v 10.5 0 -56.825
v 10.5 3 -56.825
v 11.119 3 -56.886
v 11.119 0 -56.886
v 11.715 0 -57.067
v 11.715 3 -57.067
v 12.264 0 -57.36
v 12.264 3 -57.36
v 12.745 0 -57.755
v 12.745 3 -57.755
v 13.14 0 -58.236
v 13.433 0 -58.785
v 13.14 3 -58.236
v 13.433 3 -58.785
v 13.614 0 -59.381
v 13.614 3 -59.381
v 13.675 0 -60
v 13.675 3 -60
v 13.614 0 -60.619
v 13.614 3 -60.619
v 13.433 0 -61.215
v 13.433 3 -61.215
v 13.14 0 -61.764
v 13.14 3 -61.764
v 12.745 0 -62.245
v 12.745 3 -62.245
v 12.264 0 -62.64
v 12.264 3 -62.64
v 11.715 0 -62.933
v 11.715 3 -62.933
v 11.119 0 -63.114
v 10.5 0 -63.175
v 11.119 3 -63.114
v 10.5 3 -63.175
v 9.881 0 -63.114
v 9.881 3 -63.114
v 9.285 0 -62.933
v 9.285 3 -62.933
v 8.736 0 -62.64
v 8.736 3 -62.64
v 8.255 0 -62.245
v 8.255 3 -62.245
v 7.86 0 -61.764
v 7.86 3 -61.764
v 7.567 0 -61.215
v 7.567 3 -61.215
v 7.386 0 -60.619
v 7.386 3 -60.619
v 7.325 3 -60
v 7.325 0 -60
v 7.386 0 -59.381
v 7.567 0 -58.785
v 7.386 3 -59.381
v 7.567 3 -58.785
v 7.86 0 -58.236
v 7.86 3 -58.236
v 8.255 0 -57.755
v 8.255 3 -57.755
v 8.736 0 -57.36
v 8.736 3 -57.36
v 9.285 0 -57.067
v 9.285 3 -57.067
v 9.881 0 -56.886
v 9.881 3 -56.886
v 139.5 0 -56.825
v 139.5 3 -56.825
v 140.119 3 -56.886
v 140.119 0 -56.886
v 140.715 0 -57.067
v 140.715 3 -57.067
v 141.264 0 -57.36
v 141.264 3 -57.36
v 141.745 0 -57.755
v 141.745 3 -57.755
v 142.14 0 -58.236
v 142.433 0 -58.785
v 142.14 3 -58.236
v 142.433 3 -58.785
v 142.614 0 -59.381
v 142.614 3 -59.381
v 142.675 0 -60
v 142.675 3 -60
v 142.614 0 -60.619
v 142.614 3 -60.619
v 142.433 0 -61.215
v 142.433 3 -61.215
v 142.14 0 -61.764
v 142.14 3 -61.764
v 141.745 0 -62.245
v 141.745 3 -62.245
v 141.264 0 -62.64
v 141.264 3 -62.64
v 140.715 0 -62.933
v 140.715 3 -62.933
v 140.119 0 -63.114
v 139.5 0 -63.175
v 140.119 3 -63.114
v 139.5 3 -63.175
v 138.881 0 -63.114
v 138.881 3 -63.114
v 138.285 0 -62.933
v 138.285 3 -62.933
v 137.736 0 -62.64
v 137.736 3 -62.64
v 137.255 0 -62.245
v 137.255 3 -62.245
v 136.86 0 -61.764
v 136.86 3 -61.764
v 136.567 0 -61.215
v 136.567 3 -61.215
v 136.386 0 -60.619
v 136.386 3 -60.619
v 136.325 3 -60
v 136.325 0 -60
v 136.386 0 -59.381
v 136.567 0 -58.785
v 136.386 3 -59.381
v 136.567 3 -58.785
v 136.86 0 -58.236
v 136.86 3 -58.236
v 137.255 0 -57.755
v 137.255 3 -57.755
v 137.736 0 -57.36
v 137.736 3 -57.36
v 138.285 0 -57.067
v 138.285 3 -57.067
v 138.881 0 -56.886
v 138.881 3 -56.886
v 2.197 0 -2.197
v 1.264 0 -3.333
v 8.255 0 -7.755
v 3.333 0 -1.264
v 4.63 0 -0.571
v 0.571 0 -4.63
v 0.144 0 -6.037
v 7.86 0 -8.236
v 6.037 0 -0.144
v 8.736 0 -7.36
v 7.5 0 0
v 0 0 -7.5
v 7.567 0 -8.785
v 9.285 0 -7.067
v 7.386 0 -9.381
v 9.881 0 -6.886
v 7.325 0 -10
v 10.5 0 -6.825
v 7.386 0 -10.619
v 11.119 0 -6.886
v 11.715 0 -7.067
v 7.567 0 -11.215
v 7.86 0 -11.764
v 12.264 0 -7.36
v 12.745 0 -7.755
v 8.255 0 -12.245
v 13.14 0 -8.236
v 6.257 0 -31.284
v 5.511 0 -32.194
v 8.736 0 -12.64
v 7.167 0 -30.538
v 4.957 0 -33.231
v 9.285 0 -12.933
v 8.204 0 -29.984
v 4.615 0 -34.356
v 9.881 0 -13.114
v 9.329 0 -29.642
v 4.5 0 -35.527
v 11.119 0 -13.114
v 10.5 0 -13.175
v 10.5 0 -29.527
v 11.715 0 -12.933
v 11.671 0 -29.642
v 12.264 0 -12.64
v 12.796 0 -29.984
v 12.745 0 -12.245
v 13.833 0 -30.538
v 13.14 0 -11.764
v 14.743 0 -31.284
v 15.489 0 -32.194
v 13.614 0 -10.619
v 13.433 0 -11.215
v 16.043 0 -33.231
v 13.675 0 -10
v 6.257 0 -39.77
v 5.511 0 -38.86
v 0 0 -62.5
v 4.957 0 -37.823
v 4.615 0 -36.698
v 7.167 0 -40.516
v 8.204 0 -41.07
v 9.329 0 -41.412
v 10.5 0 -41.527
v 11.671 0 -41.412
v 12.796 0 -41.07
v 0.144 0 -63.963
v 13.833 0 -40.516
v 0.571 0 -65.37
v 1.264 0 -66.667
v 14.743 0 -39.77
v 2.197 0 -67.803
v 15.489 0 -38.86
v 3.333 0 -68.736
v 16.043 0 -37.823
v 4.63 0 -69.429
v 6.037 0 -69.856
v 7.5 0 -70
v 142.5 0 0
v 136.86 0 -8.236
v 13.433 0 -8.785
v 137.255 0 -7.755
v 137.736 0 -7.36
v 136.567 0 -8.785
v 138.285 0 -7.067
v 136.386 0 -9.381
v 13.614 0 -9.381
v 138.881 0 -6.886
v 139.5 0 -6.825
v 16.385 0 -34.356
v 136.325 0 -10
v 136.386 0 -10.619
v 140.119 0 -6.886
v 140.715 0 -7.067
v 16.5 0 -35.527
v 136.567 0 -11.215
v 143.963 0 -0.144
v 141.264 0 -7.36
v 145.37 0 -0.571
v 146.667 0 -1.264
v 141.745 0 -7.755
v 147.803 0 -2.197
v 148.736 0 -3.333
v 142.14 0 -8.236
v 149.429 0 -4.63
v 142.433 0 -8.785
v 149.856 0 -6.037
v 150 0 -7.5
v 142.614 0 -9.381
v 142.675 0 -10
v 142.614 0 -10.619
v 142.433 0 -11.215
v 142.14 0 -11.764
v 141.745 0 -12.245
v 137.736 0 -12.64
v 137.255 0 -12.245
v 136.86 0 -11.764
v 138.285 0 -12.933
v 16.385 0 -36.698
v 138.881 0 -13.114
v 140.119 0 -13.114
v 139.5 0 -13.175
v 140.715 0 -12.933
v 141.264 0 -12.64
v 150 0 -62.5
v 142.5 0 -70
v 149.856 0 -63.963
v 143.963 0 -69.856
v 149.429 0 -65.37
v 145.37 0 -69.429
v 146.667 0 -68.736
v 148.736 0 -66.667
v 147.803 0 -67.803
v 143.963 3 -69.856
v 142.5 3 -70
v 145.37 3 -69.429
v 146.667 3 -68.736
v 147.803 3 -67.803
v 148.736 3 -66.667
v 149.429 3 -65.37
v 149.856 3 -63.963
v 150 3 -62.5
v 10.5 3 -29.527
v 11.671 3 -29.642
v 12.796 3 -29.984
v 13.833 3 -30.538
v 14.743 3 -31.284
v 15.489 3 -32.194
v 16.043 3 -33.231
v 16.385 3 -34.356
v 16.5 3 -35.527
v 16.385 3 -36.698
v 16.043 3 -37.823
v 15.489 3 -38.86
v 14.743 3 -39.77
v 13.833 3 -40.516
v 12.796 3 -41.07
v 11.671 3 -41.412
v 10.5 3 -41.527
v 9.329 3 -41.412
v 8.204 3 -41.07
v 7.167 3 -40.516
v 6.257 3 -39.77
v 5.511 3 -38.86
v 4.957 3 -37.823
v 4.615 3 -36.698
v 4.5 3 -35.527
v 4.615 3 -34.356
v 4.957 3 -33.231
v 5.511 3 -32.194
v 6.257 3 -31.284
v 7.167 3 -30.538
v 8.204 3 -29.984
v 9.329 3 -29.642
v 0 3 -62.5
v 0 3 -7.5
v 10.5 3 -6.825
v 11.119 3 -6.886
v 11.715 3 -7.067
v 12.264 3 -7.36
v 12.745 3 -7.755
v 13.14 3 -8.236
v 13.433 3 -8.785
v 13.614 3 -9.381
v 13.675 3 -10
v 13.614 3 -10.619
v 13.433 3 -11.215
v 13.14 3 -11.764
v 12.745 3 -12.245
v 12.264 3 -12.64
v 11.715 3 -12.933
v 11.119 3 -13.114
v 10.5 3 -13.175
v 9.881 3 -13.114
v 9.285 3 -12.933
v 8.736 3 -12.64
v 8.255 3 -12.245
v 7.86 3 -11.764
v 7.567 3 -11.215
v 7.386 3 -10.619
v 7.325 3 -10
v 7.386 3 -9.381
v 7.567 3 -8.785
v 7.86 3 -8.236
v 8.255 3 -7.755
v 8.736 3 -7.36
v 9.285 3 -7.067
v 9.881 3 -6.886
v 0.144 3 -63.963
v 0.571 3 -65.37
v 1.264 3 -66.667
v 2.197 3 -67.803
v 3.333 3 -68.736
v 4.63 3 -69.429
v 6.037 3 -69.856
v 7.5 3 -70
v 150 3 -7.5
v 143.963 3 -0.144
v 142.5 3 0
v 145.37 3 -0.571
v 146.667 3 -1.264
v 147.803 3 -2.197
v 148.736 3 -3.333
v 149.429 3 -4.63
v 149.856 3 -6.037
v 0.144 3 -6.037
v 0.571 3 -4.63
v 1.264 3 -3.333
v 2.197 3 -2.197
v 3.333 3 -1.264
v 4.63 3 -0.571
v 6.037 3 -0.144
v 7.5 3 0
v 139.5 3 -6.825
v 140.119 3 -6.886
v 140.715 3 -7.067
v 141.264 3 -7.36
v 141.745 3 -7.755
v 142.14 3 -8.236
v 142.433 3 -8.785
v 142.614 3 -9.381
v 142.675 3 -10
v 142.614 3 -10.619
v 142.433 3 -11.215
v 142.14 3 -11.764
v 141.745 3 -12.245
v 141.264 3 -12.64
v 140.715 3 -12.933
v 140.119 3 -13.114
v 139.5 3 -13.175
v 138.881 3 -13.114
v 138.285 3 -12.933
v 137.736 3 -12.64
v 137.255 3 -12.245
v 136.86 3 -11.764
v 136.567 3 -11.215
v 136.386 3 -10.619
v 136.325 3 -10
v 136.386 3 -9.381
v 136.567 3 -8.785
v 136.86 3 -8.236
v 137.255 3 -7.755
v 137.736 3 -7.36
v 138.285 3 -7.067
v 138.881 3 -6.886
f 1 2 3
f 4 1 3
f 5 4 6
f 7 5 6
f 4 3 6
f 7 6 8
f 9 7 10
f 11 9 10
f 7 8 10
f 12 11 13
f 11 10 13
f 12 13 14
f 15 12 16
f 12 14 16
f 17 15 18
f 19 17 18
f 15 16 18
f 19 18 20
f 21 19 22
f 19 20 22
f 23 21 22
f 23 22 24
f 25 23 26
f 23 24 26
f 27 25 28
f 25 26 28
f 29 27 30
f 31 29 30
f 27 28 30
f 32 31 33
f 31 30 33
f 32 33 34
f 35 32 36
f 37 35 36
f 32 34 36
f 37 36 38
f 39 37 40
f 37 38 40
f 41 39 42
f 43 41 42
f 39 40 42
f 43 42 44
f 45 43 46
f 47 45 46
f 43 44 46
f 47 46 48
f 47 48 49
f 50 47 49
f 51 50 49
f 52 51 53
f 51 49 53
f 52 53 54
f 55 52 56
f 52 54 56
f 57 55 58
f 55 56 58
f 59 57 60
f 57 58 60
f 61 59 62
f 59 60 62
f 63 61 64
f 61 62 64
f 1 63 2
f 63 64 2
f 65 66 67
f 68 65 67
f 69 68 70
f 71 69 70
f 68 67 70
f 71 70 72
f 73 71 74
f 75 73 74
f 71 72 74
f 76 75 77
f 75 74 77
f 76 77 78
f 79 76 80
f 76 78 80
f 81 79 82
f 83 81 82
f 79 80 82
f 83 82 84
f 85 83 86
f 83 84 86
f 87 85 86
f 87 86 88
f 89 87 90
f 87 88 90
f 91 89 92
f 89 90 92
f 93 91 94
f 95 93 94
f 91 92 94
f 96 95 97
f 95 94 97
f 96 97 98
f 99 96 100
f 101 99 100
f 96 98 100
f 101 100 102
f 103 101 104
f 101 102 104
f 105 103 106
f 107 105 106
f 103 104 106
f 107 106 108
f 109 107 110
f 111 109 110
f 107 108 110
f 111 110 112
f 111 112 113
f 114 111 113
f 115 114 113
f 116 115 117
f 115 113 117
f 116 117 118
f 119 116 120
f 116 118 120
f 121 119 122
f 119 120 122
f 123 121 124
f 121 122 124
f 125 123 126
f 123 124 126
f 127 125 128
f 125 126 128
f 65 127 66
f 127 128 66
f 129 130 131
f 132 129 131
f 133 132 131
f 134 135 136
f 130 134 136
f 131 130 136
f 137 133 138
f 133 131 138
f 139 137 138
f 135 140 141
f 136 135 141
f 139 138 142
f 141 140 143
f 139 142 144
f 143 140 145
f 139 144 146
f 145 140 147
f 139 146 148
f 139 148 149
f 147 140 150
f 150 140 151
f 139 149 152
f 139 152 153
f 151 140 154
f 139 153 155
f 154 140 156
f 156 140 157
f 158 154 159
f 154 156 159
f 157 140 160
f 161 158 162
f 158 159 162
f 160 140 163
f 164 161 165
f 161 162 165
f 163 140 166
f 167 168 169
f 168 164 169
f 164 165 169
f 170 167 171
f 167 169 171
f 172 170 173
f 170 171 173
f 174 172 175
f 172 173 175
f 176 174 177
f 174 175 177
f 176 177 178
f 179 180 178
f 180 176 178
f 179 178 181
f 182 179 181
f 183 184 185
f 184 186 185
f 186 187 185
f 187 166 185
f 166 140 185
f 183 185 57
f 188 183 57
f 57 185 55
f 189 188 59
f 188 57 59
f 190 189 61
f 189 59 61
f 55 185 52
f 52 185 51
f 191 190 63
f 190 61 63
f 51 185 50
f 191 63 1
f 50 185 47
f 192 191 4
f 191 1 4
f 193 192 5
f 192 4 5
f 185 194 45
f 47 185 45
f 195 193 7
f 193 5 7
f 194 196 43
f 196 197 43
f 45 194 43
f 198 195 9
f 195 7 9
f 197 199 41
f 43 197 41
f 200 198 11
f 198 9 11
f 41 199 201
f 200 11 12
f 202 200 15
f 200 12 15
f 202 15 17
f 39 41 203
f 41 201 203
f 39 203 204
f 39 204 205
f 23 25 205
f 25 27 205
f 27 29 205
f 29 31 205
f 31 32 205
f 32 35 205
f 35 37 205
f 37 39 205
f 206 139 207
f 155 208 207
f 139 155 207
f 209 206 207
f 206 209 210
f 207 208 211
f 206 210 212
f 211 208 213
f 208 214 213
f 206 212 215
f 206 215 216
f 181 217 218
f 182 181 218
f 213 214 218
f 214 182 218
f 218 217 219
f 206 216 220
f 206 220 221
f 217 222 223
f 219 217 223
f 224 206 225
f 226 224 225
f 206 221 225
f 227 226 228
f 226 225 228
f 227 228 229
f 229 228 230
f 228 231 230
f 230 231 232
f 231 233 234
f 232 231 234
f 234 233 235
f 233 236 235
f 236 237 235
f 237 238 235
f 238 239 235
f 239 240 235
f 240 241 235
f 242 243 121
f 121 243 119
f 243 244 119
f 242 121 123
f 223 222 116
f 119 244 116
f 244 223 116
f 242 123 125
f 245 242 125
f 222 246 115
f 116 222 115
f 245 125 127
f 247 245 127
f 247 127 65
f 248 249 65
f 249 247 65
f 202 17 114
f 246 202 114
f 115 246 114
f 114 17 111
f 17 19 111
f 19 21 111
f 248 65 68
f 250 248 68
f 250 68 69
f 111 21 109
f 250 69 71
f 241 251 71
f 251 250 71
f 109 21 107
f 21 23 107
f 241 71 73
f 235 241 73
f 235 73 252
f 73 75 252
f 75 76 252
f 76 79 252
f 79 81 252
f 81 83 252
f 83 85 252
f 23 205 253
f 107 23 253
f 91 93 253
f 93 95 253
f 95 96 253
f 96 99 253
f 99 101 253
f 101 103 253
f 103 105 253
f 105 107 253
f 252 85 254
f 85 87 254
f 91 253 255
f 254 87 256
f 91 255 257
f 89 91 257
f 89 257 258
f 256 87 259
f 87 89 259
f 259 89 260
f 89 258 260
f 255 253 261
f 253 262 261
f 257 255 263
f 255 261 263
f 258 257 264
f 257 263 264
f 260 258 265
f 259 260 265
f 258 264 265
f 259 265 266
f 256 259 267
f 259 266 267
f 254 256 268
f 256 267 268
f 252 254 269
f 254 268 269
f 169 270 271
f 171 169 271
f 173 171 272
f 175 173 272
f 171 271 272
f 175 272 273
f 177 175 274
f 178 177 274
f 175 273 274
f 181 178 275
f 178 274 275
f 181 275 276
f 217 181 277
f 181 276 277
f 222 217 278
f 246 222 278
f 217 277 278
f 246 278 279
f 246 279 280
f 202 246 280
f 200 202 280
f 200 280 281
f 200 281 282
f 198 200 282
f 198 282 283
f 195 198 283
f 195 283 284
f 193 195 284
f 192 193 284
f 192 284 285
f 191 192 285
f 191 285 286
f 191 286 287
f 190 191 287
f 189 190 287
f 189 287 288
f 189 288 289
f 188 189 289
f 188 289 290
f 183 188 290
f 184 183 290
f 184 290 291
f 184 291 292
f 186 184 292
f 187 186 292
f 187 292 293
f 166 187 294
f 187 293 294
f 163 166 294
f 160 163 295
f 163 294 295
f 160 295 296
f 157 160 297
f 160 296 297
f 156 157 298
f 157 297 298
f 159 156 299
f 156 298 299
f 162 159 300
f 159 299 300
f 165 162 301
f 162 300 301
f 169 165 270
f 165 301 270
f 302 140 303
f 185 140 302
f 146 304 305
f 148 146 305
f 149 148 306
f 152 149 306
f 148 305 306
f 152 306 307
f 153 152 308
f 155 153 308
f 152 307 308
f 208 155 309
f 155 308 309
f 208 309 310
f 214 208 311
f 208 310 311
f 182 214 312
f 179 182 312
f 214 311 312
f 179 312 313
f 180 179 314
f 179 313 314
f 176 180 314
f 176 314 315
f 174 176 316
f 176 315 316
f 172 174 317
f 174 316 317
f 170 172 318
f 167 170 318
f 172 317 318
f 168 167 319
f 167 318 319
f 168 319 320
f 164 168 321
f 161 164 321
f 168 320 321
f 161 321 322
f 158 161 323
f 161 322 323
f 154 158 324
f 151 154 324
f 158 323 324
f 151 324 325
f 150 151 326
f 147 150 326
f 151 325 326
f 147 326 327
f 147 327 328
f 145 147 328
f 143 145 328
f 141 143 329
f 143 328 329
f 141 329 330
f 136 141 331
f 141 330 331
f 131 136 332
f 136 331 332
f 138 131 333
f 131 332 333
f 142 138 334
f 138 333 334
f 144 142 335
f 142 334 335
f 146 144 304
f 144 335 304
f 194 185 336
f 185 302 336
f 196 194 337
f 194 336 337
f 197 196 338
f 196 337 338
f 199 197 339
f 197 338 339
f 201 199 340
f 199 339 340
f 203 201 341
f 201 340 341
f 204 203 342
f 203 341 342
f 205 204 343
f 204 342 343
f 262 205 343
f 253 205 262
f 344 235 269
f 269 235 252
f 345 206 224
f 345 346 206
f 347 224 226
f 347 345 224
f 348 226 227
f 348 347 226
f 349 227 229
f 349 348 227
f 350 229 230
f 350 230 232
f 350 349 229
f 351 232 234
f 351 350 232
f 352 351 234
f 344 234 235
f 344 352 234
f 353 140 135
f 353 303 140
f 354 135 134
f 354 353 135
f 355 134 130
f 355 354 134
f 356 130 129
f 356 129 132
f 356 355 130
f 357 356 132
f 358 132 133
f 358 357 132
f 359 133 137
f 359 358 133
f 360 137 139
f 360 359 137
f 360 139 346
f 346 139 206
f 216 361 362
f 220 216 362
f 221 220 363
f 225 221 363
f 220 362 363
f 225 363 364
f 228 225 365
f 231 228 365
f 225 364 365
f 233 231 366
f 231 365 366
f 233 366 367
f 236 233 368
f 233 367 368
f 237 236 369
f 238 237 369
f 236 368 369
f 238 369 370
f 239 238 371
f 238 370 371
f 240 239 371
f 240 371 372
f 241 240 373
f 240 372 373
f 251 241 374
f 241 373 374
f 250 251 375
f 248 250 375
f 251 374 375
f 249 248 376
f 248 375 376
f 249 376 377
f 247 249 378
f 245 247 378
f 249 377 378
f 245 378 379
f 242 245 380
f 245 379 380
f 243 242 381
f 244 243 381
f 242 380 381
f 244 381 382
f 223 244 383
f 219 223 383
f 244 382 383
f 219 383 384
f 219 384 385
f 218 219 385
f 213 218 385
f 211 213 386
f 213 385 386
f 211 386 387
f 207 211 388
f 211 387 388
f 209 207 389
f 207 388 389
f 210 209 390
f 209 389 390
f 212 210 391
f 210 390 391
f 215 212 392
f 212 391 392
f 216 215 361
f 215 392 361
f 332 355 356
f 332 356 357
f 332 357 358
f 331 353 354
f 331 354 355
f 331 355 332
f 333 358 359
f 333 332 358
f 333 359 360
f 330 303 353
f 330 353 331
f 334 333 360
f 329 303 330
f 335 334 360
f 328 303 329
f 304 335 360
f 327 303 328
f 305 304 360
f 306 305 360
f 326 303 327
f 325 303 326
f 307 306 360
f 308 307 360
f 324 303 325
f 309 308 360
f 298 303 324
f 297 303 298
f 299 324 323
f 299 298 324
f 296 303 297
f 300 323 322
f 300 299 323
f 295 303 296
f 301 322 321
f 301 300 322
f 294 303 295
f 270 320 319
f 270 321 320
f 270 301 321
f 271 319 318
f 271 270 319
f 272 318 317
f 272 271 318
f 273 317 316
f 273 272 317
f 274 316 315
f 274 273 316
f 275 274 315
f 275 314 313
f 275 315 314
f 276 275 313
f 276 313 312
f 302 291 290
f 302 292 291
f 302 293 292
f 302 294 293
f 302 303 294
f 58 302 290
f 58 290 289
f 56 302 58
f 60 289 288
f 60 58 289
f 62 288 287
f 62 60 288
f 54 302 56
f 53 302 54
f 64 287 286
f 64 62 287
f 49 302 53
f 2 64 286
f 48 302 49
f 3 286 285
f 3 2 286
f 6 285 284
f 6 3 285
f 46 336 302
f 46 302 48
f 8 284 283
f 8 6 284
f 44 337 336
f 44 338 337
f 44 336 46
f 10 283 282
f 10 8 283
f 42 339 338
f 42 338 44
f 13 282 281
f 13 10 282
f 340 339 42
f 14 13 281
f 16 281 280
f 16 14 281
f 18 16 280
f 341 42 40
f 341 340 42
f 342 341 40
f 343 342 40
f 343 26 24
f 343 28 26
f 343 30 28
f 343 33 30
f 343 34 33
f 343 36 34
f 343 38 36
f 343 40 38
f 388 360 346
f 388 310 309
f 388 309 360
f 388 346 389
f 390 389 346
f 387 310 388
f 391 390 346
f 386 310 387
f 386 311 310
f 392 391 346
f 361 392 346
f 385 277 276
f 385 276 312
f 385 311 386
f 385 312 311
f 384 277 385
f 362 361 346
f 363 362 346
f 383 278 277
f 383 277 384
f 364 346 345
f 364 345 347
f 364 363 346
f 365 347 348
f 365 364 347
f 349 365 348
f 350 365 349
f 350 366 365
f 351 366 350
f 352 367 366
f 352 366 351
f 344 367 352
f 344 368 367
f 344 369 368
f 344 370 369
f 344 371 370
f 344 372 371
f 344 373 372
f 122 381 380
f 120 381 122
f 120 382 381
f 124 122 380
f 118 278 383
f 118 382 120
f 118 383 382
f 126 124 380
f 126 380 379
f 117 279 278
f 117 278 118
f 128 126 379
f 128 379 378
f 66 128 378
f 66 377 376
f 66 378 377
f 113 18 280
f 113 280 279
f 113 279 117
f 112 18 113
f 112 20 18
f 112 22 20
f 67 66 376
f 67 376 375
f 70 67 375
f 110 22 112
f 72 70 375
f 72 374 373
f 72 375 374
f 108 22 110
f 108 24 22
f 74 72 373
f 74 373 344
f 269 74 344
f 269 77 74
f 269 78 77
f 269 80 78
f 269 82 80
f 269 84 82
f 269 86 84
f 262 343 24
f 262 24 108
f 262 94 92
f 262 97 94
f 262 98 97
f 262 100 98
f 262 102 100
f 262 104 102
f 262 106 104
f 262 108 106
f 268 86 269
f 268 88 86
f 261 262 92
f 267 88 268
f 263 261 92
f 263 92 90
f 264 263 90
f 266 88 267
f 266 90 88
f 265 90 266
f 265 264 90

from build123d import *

# Parameters (mm, degrees)
ESBO_O2_W                = 150
ESBO_O2_H                = 70
RESSALTO_EXTRUS_O1_DEPTH = 3
ESBO_O4_R                = 3.175
CORTE_EXTRUS_O1_DEPTH    = 3
FILETE1_R                = 7.5
ESBO_O6_R                = 6
CORTE_EXTRUS_O2_DEPTH    = 10


with BuildPart() as part:
    # Esboço2 → Ressalto-extrusão1 (new body)
    with BuildSketch(Plane(origin=(0, 0, 0), x_dir=(1, 0, 0), z_dir=(0, 1, 0))):
        with Locations((75, 35)):
            Rectangle(ESBO_O2_W, ESBO_O2_H)
    extrude(amount=RESSALTO_EXTRUS_O1_DEPTH)

    # Esboço4 → Corte-extrusão1 (cut)
    with BuildSketch(Plane(origin=(0, 3, 0), x_dir=(1, 0, 0), z_dir=(0, 1, 0))):
        with Locations(Location((10.5, 60, 0), (0, 0, 270))):
            Circle(ESBO_O4_R)
        with Locations(Location((139.5, 60, 0), (0, 0, 270))):
            Circle(ESBO_O4_R)
        with Locations(Location((139.5, 10, 0), (0, 0, 270))):
            Circle(ESBO_O4_R)
        with Locations(Location((10.5, 10, 0), (0, 0, 270))):
            Circle(ESBO_O4_R)
    extrude(amount=-CORTE_EXTRUS_O1_DEPTH, mode=Mode.SUBTRACT)

    # Filete1
    filete1_edges = [part.edges().sort_by_distance(p)[0] for p in [
        (0, 1.5, -70),
        (150, 1.5, -70),
        (150, 1.5, 0),
        (0, 1.5, 0),
    ]]
    fillet(filete1_edges, radius=FILETE1_R)

    # Esboço6 → Corte-extrusão2 (cut)
    with BuildSketch(Plane(origin=(0, 3, 0), x_dir=(1, 0, 0), z_dir=(0, 1, 0))):
        with Locations(Location((10.5, 35.526964124, 0), (0, 0, 270))):
            Circle(ESBO_O6_R)
    extrude(amount=-CORTE_EXTRUS_O2_DEPTH, mode=Mode.SUBTRACT)


solid = part.part
